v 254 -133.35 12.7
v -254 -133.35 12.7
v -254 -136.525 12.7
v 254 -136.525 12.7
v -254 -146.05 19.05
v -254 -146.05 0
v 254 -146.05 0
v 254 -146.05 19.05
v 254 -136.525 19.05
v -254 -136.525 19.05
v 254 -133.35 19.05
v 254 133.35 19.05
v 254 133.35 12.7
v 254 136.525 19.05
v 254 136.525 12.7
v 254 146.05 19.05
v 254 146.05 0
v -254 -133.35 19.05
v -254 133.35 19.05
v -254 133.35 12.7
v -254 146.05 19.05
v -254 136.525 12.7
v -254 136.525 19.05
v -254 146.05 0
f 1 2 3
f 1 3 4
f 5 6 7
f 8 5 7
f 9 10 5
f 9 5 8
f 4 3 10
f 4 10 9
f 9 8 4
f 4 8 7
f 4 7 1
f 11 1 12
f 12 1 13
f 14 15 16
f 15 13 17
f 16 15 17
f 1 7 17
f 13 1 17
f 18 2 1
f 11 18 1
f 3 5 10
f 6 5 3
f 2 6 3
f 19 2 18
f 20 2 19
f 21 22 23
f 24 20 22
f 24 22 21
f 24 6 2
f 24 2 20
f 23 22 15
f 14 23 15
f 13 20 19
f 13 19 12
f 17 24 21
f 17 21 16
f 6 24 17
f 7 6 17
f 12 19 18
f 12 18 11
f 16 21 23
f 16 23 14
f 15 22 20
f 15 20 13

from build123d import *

# Parameters (mm, degrees)
SKETCH_W     = 508
SKETCH_H     = 292.1
PAD_DEPTH    = 19.05
BOX_W        = 508
BOX_H        = 3.175
BOX_DEPTH    = 6.35
BOX001_W     = 508
BOX001_H     = 3.175
BOX001_DEPTH = 6.35


with BuildPart() as part:
    # Sketch → Pad (new body)
    with BuildSketch(Plane.XY):
        Rectangle(SKETCH_W, SKETCH_H)
    extrude(amount=PAD_DEPTH)

    # Box → Box (cut)
    with BuildSketch(Plane(origin=(-254, -136.525, 12.7), x_dir=(1, 0, 0), z_dir=(0, 0, 1))):
        with Locations((254, 1.5875)):
            Rectangle(BOX_W, BOX_H)
    extrude(amount=BOX_DEPTH, mode=Mode.SUBTRACT)

    # Box001 → Box001 (cut)
    with BuildSketch(Plane(origin=(-254, 133.35, 12.7), x_dir=(1, 0, 0), z_dir=(0, 0, 1))):
        with Locations((254, 1.5875)):
            Rectangle(BOX001_W, BOX001_H)
    extrude(amount=BOX001_DEPTH, mode=Mode.SUBTRACT)


solid = part.part
